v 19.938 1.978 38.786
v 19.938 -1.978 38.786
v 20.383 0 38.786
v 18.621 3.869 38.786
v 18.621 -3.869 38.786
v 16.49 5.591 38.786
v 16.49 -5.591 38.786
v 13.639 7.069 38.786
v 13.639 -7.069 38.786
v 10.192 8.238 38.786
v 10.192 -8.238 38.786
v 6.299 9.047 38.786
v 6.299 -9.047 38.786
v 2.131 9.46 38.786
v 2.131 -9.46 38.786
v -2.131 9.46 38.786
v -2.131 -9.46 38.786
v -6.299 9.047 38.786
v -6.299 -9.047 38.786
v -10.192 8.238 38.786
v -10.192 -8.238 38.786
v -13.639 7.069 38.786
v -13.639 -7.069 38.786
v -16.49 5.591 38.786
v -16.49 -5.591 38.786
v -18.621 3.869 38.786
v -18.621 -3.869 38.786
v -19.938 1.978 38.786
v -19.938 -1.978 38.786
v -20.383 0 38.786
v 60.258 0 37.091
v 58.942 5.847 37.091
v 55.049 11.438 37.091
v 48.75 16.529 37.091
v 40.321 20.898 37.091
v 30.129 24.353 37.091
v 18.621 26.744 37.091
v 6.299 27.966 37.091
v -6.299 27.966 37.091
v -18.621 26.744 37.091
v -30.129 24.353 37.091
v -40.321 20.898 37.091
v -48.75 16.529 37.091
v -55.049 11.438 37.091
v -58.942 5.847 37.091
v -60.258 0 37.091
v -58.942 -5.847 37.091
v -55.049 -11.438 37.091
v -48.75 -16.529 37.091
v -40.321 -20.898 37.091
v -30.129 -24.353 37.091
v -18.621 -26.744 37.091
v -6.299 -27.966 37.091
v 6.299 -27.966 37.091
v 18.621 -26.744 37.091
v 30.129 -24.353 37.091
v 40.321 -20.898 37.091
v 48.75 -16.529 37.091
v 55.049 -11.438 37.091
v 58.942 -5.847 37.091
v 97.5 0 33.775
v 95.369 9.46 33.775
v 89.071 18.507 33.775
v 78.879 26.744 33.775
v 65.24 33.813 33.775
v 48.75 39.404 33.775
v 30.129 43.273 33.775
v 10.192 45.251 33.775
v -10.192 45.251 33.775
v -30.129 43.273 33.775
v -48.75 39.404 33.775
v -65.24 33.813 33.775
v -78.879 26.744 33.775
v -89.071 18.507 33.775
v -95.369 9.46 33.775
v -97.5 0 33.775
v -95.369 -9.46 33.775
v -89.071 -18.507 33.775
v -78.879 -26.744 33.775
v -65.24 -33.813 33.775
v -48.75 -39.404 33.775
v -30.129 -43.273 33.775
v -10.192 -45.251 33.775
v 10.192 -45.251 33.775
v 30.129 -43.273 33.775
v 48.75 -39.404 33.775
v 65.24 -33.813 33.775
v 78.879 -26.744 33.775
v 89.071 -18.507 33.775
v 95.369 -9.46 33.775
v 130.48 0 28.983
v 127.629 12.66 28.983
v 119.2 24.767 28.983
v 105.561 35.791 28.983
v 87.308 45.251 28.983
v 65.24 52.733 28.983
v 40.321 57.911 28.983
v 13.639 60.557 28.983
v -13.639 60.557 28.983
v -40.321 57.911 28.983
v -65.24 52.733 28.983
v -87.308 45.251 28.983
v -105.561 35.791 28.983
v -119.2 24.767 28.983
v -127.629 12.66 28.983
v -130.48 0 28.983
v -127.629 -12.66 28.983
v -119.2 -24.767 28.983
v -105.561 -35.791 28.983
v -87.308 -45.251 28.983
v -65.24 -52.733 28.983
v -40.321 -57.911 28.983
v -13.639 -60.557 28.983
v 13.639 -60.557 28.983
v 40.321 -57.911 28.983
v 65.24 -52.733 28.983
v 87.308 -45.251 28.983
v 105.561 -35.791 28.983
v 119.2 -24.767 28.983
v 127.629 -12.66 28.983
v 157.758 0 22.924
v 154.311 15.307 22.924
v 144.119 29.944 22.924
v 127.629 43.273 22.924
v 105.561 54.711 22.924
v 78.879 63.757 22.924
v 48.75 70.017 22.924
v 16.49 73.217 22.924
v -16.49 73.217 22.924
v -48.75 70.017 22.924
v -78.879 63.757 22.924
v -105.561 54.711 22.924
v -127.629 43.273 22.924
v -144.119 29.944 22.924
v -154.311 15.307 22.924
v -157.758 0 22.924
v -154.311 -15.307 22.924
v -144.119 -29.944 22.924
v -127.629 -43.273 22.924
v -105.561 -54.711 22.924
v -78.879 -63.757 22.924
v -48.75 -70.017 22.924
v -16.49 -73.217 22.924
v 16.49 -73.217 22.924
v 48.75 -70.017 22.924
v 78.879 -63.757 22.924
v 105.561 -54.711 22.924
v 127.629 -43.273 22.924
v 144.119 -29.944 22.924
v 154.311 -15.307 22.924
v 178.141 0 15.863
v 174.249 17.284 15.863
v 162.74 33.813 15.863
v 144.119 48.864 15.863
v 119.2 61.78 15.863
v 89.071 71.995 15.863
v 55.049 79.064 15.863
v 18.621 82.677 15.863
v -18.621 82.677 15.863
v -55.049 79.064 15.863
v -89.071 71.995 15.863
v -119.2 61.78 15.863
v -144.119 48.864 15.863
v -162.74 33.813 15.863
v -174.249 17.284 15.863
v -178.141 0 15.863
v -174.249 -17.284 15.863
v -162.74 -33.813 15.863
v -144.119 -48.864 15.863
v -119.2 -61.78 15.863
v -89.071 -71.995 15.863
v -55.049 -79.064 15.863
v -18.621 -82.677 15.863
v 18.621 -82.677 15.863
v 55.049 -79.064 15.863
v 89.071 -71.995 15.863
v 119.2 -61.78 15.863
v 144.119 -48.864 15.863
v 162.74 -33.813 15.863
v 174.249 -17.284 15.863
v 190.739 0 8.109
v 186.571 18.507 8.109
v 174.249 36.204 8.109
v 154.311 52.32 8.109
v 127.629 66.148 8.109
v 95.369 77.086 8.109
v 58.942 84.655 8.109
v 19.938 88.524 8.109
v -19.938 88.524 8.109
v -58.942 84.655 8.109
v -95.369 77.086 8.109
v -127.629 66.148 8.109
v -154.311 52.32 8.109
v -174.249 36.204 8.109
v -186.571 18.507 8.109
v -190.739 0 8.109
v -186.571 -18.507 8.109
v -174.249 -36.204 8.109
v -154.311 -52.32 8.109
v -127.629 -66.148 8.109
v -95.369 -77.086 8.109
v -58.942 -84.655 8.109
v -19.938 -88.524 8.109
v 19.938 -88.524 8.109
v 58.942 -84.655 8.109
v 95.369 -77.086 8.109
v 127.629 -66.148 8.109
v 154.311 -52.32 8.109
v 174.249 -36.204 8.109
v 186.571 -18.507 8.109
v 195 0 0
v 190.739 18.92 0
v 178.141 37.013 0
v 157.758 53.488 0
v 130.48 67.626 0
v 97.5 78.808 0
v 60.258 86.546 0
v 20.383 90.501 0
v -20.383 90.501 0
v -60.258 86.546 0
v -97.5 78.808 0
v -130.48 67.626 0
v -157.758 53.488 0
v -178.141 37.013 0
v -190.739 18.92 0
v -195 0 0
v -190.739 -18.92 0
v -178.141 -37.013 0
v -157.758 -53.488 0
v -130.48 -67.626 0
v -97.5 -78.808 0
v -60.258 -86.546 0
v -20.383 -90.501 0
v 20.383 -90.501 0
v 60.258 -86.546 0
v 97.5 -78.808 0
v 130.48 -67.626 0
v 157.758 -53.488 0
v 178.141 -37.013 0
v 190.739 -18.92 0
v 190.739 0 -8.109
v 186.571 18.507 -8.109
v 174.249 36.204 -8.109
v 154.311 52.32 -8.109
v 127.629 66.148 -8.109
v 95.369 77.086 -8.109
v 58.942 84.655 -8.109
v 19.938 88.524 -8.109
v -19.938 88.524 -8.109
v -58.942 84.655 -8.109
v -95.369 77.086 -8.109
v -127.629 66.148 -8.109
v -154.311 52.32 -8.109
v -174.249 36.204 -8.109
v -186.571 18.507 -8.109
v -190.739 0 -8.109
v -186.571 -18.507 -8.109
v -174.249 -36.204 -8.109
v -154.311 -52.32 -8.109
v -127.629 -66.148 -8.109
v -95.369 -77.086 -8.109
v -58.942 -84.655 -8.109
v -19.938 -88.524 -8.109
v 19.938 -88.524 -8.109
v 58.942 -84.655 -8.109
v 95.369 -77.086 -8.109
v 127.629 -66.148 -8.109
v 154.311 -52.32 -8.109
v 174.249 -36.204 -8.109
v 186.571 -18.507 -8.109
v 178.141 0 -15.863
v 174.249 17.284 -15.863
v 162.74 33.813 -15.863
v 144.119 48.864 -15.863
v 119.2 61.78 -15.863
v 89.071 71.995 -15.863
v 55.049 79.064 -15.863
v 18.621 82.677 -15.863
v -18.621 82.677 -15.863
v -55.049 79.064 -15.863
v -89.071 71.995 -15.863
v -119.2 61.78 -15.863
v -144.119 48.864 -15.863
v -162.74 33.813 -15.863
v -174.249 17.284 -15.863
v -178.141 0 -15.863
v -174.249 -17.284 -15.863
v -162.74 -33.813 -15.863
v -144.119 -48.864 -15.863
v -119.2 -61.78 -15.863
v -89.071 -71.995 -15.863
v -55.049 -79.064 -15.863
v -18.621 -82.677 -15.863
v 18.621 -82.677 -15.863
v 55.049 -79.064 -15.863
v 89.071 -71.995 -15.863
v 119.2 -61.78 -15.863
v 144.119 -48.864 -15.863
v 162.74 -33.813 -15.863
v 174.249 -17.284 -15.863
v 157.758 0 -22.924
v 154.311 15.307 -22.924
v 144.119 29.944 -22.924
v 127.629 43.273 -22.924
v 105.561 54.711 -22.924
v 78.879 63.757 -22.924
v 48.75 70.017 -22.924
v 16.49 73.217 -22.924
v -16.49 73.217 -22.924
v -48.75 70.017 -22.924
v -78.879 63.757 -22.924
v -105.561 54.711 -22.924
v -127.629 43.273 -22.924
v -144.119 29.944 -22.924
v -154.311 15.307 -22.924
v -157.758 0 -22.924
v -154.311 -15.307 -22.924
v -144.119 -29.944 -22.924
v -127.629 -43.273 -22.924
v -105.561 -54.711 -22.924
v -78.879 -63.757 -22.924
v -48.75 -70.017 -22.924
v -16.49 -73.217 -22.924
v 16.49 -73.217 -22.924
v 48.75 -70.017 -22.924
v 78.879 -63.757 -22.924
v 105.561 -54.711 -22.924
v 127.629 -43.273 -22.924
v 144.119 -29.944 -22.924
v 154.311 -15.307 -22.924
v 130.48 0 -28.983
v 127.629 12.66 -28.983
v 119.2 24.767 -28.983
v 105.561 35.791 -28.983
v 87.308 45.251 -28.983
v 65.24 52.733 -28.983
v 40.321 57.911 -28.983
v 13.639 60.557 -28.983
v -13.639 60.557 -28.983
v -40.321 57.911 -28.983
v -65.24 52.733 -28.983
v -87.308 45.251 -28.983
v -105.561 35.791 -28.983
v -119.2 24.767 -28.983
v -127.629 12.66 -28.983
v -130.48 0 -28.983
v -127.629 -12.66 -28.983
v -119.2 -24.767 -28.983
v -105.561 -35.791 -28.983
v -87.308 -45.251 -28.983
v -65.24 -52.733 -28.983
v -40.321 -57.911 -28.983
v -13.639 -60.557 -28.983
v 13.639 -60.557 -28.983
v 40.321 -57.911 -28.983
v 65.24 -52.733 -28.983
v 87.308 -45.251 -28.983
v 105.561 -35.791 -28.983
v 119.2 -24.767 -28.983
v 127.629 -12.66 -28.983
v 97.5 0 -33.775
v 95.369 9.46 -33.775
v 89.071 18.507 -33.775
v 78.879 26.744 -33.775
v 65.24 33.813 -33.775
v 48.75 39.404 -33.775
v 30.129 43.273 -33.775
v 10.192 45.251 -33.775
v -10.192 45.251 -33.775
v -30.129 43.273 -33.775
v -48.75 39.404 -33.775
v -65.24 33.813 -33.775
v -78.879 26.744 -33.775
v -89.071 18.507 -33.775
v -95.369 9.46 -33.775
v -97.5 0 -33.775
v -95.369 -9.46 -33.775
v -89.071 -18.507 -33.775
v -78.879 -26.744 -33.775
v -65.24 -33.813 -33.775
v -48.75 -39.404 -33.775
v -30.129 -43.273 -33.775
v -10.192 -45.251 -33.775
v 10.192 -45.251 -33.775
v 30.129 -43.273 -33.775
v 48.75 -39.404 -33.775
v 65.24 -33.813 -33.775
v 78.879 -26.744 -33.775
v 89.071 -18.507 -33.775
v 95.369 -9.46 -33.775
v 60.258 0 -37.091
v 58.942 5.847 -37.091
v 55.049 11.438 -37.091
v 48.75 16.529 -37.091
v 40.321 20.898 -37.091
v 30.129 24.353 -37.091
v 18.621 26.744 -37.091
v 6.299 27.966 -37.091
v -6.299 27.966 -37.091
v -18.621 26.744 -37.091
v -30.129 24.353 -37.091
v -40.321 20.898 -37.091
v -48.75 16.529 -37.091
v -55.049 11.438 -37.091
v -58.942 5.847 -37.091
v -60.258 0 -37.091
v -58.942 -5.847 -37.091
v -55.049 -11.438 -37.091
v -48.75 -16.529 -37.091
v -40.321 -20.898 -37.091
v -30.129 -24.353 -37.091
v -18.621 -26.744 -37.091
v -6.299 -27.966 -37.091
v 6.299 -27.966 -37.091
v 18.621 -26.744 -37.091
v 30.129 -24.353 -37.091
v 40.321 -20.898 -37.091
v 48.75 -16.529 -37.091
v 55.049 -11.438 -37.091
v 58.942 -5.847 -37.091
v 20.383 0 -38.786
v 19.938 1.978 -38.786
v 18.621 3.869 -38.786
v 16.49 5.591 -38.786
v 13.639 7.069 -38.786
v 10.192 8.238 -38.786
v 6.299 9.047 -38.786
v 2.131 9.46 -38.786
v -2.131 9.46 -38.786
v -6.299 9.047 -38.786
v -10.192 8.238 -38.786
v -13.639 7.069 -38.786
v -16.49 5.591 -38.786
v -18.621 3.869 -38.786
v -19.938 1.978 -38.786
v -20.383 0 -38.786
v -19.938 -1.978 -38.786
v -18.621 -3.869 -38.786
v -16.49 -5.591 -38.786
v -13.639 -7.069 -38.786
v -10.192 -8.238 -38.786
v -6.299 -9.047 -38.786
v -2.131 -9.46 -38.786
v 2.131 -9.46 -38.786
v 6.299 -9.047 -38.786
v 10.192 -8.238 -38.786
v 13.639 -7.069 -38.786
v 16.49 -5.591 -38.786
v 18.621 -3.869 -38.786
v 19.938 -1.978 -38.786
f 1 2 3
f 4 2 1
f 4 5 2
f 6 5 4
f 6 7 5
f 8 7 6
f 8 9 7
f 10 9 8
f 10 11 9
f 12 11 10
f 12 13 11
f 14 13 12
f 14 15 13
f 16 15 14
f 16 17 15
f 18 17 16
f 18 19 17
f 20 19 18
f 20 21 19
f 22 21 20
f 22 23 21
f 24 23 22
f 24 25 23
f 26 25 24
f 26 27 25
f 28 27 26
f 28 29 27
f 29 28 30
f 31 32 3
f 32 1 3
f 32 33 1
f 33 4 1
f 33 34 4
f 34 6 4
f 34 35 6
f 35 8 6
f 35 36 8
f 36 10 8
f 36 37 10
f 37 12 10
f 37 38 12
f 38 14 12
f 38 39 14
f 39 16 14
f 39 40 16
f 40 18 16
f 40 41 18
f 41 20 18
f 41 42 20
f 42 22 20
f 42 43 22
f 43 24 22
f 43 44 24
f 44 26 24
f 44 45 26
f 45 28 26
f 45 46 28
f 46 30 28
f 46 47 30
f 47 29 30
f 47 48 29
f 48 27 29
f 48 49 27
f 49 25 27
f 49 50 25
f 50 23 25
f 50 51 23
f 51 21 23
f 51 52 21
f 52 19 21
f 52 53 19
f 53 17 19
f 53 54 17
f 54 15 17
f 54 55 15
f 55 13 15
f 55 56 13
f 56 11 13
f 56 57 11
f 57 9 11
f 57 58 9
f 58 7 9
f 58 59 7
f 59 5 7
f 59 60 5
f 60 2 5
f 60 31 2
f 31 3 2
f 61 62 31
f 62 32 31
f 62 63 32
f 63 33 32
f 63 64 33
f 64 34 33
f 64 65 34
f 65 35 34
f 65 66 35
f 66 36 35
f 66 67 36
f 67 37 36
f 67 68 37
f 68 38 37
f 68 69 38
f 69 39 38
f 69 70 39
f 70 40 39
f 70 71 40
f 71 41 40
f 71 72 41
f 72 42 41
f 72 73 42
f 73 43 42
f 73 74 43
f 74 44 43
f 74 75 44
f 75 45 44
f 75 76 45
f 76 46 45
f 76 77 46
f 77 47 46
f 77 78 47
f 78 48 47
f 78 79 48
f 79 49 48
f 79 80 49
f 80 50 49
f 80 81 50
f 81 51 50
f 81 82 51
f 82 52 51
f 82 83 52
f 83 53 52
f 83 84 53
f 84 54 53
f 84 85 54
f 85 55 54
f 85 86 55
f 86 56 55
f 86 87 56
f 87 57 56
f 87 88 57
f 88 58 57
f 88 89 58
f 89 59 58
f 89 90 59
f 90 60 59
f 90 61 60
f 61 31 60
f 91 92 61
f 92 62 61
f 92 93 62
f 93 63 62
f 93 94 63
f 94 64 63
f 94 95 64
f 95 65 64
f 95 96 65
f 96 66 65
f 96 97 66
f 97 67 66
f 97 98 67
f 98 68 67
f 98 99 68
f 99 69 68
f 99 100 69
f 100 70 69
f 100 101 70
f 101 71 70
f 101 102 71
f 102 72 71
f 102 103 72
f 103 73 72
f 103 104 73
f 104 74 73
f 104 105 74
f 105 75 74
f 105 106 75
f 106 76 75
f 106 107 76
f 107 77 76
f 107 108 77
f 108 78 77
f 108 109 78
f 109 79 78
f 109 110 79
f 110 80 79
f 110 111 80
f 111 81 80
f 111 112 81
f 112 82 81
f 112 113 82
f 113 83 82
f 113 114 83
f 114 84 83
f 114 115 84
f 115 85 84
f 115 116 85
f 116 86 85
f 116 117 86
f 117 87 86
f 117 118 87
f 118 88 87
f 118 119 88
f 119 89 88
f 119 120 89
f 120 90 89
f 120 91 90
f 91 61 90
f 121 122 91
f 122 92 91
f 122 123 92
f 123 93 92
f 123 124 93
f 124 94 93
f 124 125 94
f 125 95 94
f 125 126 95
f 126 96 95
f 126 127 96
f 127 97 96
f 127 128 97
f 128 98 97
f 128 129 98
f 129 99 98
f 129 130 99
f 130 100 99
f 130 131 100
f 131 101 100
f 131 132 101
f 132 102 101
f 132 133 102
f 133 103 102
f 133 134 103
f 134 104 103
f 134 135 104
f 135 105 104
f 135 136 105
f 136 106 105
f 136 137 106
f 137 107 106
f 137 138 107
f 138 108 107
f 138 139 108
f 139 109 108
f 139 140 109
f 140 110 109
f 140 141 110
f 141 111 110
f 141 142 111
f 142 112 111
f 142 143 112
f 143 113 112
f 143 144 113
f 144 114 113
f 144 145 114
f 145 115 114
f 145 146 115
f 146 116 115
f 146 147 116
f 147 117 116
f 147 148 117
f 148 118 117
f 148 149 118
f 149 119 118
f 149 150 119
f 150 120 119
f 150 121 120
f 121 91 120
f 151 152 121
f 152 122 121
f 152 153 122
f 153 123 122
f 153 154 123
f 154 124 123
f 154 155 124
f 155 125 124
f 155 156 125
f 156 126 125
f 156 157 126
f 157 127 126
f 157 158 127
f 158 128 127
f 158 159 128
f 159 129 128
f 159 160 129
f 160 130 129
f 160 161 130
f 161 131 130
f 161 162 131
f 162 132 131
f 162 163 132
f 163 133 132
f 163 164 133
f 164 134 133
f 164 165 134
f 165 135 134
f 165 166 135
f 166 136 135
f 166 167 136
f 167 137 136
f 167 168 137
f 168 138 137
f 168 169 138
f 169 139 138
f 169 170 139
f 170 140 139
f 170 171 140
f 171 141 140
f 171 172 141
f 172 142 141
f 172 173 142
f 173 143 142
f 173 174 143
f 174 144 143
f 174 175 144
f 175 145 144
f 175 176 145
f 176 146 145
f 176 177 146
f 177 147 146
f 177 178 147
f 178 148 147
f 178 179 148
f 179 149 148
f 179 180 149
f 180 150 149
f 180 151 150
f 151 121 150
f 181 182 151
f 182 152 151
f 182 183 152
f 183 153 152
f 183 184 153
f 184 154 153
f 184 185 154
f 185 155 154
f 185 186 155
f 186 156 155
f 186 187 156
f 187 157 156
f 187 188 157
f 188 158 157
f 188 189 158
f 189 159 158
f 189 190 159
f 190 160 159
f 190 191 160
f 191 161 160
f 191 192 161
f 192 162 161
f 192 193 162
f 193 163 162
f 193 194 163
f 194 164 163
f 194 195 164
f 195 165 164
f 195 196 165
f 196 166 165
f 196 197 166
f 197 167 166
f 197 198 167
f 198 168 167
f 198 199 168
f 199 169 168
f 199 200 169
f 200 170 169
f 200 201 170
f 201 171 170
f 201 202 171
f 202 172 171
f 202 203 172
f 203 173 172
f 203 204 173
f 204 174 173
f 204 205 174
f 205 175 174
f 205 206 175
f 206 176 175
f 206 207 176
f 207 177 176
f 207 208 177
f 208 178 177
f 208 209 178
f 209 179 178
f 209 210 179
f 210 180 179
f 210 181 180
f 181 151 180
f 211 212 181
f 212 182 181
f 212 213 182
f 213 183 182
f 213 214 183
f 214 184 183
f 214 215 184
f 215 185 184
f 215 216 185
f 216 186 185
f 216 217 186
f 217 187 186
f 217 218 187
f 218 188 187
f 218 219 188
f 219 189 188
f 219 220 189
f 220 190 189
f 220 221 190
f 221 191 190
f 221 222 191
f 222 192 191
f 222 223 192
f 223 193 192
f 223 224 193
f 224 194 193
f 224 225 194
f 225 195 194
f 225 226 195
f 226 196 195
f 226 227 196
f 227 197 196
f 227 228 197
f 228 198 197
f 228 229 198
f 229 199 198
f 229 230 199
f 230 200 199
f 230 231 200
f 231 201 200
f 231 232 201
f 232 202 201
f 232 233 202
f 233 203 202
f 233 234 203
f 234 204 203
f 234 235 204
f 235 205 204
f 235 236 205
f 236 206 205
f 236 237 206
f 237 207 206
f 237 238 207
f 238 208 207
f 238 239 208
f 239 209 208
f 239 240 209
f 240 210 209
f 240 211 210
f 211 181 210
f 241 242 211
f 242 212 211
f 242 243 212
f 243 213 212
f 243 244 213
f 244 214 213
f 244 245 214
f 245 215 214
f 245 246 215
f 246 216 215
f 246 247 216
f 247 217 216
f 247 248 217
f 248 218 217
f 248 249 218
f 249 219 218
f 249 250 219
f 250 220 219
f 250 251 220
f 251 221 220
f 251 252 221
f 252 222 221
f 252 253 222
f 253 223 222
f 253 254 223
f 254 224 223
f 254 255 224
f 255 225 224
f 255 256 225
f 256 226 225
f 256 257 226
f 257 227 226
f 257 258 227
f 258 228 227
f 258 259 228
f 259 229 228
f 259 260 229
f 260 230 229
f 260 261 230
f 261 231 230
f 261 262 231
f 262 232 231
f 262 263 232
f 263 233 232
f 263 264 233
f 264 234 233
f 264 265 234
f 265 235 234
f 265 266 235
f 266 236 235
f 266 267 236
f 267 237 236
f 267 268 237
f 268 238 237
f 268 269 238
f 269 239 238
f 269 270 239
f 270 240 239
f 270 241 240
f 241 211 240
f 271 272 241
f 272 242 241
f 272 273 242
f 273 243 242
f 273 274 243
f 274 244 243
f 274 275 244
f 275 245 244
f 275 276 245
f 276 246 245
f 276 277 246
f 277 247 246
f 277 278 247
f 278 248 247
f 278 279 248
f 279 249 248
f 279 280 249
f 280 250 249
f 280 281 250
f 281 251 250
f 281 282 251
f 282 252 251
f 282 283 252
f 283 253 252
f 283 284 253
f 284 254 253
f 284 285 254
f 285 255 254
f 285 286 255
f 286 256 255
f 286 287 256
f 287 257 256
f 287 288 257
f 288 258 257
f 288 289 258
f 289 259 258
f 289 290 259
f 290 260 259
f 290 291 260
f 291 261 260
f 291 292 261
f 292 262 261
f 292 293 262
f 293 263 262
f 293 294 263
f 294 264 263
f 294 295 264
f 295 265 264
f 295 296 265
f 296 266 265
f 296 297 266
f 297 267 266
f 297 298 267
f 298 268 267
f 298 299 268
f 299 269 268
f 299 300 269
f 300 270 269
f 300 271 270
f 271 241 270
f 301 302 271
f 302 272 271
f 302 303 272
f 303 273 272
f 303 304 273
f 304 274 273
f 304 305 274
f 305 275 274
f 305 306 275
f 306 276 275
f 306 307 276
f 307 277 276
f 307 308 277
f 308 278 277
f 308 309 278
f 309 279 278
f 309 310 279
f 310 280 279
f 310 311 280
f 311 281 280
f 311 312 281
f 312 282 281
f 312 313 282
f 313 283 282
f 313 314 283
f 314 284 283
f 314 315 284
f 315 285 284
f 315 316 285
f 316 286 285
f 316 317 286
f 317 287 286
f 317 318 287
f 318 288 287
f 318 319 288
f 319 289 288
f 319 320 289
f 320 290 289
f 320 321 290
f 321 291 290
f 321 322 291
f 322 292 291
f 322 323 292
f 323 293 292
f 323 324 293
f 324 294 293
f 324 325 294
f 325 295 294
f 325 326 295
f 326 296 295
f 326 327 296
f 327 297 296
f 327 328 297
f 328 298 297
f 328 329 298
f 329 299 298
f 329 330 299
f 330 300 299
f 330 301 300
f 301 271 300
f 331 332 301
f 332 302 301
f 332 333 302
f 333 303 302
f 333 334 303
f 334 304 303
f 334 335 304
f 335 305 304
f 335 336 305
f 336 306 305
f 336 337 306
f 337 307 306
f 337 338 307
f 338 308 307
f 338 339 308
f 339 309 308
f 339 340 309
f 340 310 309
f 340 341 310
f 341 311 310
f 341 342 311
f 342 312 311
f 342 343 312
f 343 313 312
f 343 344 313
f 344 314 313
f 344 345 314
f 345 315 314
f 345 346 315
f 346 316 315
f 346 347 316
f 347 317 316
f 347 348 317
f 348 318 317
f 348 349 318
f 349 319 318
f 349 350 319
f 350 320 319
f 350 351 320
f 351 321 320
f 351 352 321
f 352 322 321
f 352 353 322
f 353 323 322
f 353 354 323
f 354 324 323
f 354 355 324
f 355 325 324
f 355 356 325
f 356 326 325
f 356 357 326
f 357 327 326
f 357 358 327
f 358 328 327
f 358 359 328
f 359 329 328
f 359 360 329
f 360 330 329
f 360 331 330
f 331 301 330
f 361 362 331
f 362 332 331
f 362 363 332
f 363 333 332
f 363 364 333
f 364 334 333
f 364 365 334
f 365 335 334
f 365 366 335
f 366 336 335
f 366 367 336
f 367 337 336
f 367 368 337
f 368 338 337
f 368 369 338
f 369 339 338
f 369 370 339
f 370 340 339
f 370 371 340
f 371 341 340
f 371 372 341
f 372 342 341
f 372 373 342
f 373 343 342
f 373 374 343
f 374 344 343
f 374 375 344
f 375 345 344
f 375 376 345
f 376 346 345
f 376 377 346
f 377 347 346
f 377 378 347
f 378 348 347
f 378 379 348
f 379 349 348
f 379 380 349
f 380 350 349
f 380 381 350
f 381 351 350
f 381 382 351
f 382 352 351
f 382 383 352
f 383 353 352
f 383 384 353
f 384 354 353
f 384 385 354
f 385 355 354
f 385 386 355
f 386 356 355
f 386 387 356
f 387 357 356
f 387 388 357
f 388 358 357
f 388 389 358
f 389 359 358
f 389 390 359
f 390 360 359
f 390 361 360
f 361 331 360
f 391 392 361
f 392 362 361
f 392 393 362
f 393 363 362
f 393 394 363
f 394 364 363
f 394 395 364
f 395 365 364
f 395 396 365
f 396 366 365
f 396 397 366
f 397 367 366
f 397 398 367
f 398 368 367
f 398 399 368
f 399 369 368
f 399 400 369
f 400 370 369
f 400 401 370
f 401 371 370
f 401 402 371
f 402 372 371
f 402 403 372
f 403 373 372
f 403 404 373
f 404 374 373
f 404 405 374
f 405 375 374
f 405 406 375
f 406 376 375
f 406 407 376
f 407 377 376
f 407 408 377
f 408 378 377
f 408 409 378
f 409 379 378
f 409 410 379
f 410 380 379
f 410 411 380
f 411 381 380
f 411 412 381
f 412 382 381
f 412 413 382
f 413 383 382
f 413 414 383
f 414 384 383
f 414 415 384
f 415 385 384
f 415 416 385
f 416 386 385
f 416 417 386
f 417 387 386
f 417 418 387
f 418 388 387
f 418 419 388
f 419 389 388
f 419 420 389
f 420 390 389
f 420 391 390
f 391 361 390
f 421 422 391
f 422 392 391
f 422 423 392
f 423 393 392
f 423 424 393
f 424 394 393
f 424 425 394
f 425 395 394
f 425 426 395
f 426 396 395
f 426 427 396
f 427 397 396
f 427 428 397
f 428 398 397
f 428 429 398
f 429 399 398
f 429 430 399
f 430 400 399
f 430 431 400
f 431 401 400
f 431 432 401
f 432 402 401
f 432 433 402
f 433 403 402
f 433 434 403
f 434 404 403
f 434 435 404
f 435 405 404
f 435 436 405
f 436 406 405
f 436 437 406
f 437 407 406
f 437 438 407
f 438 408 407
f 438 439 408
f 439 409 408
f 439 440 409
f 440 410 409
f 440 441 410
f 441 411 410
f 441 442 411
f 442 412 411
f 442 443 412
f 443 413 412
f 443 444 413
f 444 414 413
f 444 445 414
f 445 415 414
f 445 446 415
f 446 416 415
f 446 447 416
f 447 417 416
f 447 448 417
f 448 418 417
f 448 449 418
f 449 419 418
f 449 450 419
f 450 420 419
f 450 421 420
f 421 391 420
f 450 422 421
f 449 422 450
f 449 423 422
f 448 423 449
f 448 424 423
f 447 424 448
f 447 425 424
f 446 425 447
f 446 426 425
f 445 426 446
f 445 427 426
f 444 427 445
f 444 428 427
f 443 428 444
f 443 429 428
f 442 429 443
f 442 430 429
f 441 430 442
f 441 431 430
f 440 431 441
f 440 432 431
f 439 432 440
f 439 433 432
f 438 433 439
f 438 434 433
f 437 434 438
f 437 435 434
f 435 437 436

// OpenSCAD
// Generated by SolidPython 1.0.1 on 2020-07-29 00:46:51


scale(v = [15, 7, 3]) {
	sphere(r = 13);
}
/***********************************************
*********      SolidPython code:      **********
************************************************
 
# import packages: SolidPython
from solid import *
from solid.utils import *
from itertools import chain, combinations, permutations


class Resize:

    def __init__(self, scad_file):
        self.scad_file = scad_file
        #self.scad_file = import_scad(scad_file)
        # cone/cylinder param:
        self.r1 = 0
        self.r2 = 0
        self.h = 0
        # rectangular prism param:
        self.w = 0
        self.l = 0
        # ellipse param:
        self.r = 0

    # import OpenScad code (file name corresponds to shape)


    # classify shape + parameters
    def assign(self, param1, param2, param3):
        if self.scad_file == 'cone.scad':
            self.r1 = param1
            self.r2 = param2
            self.h = param3
        elif self.scad_file == 'cylinder.scad':
            self.r1 = param1
            self.r2 = param2
            self.h = param3
        elif self.scad_file == 'rectangularPrism.scad':
            self.h = param1
            self.l = param2
            self.w = param3
        else:
            self.r = param1
            self.h = param2

    # resize parameters
    def iterate(self):
        x = range(3, 20, 2)
        i = 1
        if self.scad_file == 'cone.scad':
            tempList = list(permutations(x, 2))
            for temp in tempList:
                param1 = temp[0]
                param2 = temp[1]
                filepath = 'produced_scad_files/' + 'cone' + str(param1) + '_' + str(param2) + '_' + '.scad'
                scad_render_to_file(cylinder(h=param1, r1=param2, r2=0), filepath)

        elif self.scad_file == 'cylinder.scad':
            tempList = list(permutations(x, 3))
            for temp in tempList:
                param1 = temp[0]
                param2 = temp[1]
                filepath = 'produced_scad_files/' + 'cylinder' + str(param1) + '_' + str(param2) + '_' + '.scad'
                scad_render_to_file(cylinder(h=param1, r1=param2, r2=param2), filepath)

        elif self.scad_file == 'rectangularPrism.scad':
            tempList = list(permutations(x, 3))
            for temp in tempList:
                param1 = temp[0]
                param2 = temp[1]
                param3 = temp[2]
                filepath = 'produced_scad_files/' + 'rectangularPrism' + str(param1) + '_' + str(param2) + '_' + str(
                    param3) + '.scad'
                scad_render_to_file(cube(size=(param1, param2, param3)), filepath)

        elif self.scad_file == 'ellipse.scad':
            tempList = list(permutations(x, 4))
            for temp in tempList:
                param1 = temp[0]
                param2 = temp[1]
                param3 = temp[2]
                param4 = temp[3]
                filepath = 'produced_scad_files/' + 'ellipse' + str(param1) + '_' + str(param2) + '_' + str(param3) + '_' + str(param4) + '.scad'
                scad_render_to_file(scale([param1, param2, param3])(sphere(r=param4)), filepath)

    def render_to_scadfile(self):
        scad_render_to_file(scad, 'example.scad') 
 
************************************************/
